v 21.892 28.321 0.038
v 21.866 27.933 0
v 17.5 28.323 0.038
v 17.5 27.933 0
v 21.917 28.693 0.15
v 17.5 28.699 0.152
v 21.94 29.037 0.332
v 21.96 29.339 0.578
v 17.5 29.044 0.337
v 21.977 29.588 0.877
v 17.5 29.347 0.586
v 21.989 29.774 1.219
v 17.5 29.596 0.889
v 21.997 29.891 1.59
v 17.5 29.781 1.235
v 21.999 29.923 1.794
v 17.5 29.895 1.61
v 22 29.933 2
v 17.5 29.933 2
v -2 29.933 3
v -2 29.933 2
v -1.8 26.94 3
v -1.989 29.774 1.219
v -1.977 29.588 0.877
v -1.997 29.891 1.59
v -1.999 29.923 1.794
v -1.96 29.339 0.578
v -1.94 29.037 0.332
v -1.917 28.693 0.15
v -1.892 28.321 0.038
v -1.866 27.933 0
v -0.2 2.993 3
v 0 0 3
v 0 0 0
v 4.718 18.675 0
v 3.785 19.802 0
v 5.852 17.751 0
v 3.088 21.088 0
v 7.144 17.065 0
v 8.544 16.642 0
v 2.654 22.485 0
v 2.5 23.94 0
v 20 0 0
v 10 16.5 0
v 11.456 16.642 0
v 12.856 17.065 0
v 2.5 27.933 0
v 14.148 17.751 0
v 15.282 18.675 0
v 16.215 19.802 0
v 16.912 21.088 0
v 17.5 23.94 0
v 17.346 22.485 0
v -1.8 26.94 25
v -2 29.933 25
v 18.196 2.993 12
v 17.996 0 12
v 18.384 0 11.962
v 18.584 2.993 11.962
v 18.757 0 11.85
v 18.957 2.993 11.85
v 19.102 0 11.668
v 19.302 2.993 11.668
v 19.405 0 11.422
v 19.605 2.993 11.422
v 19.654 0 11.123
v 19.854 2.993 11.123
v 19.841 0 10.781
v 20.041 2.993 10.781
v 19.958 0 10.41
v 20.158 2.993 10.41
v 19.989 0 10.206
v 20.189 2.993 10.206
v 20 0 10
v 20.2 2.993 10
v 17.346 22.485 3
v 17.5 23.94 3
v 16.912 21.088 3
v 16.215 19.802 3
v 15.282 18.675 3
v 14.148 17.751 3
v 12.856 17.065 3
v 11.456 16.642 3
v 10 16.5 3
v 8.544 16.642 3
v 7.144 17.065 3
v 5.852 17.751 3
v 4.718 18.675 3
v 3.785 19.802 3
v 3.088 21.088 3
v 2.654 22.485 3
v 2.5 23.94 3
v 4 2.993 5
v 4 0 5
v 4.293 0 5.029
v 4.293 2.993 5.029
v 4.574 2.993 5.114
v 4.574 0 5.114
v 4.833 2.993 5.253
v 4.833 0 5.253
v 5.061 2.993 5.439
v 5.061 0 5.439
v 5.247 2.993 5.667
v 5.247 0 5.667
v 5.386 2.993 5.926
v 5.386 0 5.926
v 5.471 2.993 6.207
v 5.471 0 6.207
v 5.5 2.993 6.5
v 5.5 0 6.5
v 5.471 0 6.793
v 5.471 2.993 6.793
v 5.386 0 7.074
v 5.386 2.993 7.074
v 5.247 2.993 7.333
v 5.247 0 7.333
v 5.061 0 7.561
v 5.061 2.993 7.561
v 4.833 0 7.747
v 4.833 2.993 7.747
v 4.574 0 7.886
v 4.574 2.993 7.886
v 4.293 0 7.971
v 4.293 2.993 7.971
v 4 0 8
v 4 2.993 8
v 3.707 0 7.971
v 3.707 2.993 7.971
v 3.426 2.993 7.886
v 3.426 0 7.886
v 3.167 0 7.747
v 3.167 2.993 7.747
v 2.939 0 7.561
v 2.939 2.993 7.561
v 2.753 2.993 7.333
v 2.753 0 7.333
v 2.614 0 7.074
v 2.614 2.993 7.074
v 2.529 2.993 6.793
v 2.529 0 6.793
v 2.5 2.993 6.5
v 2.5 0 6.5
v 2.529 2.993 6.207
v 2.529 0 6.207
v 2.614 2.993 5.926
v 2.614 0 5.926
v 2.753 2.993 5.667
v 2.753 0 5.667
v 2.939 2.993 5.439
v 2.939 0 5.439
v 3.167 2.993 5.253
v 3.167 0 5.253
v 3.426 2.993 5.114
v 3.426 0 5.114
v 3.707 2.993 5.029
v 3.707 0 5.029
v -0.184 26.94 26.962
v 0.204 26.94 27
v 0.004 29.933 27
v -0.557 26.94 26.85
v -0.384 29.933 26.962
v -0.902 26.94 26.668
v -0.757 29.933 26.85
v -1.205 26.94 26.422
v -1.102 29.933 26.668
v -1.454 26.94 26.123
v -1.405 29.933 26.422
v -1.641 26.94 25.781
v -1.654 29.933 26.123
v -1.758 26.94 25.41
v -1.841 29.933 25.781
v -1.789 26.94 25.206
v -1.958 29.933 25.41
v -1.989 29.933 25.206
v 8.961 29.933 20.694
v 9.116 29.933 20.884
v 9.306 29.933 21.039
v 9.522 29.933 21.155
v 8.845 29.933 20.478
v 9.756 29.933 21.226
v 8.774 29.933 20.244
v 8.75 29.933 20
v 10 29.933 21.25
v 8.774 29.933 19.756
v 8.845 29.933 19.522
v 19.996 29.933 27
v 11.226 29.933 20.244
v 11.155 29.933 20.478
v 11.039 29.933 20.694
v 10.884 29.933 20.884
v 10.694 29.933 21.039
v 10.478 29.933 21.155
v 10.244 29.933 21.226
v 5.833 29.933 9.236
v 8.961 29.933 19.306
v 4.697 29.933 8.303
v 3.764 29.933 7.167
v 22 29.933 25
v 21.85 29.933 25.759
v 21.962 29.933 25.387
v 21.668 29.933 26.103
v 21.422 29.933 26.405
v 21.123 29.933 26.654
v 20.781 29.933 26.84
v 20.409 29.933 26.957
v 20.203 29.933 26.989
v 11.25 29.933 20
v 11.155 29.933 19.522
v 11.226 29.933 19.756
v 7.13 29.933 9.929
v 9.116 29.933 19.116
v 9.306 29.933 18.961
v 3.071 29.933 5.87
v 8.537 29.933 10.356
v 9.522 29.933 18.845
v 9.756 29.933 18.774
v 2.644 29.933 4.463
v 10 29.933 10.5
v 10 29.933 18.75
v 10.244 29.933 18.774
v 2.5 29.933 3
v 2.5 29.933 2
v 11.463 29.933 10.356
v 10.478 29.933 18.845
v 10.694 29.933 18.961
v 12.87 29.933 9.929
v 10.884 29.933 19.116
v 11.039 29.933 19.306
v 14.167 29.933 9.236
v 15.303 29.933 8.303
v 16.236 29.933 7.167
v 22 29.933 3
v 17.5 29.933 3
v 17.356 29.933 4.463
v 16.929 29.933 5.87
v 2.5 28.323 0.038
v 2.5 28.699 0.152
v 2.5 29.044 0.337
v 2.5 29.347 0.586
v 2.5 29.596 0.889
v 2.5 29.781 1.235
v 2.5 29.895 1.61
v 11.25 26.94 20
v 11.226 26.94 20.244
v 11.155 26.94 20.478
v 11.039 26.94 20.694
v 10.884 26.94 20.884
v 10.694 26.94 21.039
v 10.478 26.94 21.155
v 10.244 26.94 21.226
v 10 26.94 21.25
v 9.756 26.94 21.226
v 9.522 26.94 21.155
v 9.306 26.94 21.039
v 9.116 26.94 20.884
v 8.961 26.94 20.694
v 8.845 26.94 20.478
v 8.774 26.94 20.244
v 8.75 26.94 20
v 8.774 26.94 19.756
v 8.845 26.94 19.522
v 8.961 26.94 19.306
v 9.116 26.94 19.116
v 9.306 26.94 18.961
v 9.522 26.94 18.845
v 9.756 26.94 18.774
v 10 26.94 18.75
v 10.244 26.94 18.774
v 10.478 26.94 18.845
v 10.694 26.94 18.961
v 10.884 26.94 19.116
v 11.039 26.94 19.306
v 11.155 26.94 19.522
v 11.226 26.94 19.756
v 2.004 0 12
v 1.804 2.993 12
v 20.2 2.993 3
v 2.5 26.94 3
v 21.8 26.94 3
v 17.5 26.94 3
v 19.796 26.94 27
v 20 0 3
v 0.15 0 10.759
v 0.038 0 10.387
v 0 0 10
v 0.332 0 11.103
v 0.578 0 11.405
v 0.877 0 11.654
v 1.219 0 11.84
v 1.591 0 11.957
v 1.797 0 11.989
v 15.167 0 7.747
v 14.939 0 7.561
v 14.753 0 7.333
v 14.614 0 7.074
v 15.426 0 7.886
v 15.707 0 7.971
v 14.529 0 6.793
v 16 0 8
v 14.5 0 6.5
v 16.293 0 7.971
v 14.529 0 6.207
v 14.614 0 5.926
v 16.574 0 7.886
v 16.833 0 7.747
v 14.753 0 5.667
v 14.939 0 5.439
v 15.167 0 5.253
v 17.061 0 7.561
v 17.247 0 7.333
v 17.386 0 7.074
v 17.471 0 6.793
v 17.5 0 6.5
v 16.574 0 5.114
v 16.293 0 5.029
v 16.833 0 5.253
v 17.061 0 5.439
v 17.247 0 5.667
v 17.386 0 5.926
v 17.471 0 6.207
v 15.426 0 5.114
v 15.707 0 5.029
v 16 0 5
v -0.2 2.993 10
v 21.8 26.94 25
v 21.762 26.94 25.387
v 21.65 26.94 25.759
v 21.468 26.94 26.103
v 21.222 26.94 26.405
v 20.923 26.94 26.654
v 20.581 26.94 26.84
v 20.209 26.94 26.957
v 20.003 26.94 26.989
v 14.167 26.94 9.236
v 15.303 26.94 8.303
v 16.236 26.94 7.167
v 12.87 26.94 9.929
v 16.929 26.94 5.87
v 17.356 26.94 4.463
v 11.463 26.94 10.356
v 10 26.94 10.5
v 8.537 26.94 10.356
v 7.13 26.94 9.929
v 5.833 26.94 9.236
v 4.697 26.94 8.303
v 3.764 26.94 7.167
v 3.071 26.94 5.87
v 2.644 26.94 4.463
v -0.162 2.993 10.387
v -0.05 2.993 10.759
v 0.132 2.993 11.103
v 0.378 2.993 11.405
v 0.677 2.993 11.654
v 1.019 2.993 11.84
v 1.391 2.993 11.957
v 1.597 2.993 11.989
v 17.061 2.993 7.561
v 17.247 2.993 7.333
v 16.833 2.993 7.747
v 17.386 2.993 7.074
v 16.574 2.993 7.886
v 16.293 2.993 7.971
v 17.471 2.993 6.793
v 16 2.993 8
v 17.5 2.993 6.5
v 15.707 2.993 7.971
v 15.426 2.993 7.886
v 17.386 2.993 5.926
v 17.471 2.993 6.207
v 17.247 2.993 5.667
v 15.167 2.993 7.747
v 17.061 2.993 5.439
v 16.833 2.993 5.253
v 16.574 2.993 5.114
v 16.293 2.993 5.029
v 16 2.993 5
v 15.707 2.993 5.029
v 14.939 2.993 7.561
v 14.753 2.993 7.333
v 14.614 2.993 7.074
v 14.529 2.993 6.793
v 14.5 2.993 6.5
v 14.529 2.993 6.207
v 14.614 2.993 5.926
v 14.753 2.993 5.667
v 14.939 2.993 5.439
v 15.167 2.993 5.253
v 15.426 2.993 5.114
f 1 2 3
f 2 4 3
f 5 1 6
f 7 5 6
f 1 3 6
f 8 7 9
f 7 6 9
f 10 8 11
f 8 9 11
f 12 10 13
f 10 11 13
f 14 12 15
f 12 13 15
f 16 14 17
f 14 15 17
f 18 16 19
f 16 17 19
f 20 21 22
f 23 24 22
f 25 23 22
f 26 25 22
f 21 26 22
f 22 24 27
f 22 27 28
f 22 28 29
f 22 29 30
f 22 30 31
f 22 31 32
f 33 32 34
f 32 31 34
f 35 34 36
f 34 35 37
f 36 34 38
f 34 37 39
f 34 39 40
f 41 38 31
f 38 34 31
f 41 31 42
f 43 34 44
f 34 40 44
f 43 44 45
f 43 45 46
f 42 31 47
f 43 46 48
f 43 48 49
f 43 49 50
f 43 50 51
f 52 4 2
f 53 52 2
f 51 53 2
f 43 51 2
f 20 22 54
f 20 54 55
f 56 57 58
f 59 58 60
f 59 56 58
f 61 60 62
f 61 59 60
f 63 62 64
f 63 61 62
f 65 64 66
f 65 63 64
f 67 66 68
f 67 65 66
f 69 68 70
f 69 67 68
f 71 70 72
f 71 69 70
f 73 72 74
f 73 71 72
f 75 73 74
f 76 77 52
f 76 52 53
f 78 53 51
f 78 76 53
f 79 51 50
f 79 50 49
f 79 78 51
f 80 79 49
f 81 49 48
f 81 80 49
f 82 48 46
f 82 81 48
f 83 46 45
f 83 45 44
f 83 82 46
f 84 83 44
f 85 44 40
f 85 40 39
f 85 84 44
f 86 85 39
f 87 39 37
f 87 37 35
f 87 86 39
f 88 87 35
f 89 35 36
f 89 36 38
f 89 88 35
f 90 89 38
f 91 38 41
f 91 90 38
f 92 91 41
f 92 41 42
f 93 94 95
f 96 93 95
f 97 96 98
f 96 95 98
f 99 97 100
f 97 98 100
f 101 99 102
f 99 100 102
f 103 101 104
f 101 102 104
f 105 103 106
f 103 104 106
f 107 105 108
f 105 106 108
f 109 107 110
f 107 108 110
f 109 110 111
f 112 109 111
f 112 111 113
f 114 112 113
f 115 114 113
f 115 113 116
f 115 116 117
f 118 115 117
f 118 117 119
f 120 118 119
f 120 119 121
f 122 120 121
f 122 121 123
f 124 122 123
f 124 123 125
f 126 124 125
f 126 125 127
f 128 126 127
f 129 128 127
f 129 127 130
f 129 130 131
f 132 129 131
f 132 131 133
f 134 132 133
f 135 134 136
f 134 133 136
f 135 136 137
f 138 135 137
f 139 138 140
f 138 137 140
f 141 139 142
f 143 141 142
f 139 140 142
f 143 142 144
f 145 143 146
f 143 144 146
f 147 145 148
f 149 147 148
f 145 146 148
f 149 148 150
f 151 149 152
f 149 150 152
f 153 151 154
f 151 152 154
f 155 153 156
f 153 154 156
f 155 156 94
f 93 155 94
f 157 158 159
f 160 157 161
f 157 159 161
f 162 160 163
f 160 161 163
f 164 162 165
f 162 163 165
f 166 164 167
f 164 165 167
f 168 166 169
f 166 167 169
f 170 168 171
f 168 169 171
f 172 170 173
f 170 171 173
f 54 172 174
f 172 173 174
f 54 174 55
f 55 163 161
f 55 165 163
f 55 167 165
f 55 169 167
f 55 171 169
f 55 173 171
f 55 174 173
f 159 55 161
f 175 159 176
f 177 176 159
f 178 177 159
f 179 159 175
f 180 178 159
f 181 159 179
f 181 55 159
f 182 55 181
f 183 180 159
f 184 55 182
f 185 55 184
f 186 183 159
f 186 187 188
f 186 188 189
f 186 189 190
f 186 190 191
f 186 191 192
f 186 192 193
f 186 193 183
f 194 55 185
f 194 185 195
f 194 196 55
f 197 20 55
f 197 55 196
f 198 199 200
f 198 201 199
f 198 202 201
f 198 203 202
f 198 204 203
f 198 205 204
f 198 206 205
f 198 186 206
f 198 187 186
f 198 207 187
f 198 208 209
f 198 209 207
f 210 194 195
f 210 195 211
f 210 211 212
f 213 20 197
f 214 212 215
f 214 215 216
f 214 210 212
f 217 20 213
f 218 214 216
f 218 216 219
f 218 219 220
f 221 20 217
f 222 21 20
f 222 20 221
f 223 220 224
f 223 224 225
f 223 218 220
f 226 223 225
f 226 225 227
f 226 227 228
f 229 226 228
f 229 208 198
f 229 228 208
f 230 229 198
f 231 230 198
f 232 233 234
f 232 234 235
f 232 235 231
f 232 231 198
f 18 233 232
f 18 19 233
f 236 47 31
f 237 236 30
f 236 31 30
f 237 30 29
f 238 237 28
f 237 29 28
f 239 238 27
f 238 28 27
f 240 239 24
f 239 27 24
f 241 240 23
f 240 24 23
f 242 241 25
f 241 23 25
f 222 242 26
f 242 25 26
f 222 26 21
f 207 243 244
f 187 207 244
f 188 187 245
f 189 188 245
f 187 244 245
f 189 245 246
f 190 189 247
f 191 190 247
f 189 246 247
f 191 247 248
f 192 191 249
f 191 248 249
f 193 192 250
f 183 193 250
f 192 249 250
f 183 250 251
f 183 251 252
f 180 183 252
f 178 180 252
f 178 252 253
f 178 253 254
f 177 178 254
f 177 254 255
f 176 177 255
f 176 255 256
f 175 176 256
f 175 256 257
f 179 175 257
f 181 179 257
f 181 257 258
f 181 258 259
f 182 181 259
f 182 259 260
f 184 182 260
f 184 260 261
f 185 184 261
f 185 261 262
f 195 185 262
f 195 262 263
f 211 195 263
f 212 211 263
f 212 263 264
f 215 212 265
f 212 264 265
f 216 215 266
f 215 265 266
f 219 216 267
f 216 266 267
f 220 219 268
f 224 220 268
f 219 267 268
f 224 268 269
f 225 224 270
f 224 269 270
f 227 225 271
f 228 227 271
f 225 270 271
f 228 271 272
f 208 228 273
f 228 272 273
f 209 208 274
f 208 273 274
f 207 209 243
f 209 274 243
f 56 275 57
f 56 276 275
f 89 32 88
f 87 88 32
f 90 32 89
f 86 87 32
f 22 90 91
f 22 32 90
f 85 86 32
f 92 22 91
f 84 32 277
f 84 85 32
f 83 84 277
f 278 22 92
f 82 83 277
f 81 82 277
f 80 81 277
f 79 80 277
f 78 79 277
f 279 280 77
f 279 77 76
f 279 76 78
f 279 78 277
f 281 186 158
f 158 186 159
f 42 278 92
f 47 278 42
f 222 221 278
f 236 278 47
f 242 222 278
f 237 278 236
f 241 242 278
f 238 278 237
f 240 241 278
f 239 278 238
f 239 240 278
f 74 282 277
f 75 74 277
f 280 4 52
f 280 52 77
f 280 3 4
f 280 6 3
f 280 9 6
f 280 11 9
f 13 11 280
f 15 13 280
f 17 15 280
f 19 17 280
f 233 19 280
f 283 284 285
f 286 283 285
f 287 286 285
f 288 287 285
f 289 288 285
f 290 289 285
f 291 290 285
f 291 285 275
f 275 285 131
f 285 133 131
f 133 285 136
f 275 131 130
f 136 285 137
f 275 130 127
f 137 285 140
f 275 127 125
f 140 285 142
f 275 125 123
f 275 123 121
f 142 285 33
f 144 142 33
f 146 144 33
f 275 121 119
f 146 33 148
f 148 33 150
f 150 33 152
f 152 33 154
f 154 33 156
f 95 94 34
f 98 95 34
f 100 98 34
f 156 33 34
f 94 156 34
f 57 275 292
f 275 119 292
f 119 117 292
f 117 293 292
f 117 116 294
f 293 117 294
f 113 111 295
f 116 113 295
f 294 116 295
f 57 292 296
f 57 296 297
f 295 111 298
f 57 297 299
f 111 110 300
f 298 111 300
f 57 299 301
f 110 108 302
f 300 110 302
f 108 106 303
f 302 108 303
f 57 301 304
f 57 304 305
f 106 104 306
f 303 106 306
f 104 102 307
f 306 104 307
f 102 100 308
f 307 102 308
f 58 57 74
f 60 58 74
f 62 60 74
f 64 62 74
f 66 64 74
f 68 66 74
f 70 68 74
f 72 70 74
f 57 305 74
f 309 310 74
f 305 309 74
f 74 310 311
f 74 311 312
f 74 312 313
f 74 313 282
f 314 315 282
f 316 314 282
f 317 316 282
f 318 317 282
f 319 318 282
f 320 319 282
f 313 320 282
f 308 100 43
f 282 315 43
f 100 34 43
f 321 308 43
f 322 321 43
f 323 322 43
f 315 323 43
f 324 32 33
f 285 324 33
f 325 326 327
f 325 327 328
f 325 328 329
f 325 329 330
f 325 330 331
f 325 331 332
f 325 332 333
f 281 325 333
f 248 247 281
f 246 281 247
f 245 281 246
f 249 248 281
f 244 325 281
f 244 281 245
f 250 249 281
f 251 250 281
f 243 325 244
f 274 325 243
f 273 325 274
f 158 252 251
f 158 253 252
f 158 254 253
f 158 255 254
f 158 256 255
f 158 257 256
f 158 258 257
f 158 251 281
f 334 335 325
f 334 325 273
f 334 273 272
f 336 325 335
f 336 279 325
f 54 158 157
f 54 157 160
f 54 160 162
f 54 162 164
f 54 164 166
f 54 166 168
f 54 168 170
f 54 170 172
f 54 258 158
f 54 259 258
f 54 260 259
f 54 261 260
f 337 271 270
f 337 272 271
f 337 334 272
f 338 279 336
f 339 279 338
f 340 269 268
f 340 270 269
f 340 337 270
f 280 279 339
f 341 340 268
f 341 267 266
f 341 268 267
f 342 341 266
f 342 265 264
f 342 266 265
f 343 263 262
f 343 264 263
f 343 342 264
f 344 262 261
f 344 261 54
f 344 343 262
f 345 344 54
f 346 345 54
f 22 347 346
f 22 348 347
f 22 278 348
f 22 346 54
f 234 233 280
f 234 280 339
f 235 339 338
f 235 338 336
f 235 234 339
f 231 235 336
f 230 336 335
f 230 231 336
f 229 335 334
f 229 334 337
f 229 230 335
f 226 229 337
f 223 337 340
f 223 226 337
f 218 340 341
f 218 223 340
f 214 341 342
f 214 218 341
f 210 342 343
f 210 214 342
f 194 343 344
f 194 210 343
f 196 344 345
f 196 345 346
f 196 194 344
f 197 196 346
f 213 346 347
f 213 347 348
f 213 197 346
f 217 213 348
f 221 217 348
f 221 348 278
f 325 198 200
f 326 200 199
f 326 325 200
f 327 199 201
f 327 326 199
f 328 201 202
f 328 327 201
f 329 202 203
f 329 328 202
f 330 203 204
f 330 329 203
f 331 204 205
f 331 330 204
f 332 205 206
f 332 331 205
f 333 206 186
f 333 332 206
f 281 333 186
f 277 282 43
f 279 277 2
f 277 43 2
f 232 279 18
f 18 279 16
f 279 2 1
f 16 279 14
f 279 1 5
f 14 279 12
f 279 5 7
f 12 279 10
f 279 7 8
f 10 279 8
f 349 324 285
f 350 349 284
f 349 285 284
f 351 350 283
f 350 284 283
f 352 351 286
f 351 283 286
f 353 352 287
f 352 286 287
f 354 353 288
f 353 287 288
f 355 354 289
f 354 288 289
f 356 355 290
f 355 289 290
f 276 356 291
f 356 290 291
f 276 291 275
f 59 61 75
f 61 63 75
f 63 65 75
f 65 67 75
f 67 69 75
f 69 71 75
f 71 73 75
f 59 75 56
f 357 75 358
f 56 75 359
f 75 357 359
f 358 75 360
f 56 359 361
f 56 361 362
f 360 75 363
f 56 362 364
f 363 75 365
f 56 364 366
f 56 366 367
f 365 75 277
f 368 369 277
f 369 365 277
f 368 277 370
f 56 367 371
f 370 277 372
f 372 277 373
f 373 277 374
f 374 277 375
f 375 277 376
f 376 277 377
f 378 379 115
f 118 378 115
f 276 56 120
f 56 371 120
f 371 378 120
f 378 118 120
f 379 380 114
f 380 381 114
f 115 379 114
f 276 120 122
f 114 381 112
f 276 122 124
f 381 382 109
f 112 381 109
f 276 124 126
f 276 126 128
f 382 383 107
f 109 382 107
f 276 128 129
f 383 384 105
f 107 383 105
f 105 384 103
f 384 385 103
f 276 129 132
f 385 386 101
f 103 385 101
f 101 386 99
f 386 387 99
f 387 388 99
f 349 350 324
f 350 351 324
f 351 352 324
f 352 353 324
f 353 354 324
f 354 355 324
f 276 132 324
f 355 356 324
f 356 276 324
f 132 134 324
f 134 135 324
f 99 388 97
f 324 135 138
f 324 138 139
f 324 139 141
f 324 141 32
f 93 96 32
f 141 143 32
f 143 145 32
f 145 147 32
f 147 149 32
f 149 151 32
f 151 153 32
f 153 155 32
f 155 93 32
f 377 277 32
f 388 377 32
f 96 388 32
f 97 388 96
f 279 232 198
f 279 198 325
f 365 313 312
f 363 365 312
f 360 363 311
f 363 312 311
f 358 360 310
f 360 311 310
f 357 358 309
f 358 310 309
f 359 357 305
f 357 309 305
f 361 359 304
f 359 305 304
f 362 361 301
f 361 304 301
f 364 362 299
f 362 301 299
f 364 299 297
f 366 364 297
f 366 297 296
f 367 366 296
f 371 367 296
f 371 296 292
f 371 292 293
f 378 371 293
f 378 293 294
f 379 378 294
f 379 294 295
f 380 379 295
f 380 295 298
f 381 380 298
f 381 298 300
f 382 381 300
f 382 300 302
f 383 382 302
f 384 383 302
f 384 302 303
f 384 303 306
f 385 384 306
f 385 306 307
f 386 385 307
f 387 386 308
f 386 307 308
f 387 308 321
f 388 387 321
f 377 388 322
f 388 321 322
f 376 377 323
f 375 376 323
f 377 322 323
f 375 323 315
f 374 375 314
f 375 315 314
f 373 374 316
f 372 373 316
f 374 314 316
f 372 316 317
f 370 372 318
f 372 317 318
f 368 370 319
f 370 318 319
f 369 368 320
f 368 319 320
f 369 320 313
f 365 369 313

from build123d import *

# Parameters (mm, degrees)
SALIENTE_EXTRUIR1_DEPTH      = 3
SALIENTE_EXTRUIR2_DEPTH      = 9
SALIENTE_EXTRUIR3_DEPTH      = 24
CORTAR_EXTRUIR1_DEPTH        = 3
CORTAR_EXTRUIR_L_MINA1_START = -2.993325909
CORTAR_EXTRUIR_L_MINA1_DEPTH = 2.993325909
REDONDEO1_R                  = 2
CROQUIS6_R                   = 1.25
CORTAR_EXTRUIR2_DEPTH        = 3
CROQUIS7_R                   = 1.5
CORTAR_EXTRUIR3_DEPTH        = 3


# Read off the part's stored shape, not the designer's step: Cortar-Extruir-Lámina1
with BuildPart() as part:
    # Croquis1 → Saliente-Extruir1 (new body)
    with BuildSketch(Plane.XY):
        Polygon((0, 0), (20, 0), (22, 29.933259094), (-2, 29.933259094), align=None)
    extrude(amount=SALIENTE_EXTRUIR1_DEPTH)

    # Croquis2 → Saliente-Extruir2 (add)
    with BuildSketch(Plane.XY.offset(3)):
        Polygon((0, 0), (20, 0), (20.2, 2.993325909), (-0.2, 2.993325909), align=None)
    extrude(amount=SALIENTE_EXTRUIR2_DEPTH)

    # Croquis3 → Saliente-Extruir3 (add)
    with BuildSketch(Plane.XY.offset(3)):
        Polygon((22, 29.933259094), (21.8, 26.939933185), (-1.8, 26.939933185), (-2, 29.933259094), align=None)
    extrude(amount=SALIENTE_EXTRUIR3_DEPTH)

    # Croquis4 → Cortar-Extruir1 (cut)
    with BuildSketch(Plane.XY.offset(3)):
        with BuildLine():
            Line((17.5, 26.939933185), (17.5, 23.939933185))
            ThreePointArc((17.5, 23.939933185), (10, 16.499759469), (2.5, 23.939933185))
            Line((2.5, 23.939933185), (2.5, 26.939933185))
            Line((2.5, 26.939933185), (17.5, 26.939933185))
        make_face()
    extrude(amount=-CORTAR_EXTRUIR1_DEPTH, mode=Mode.SUBTRACT)

    # Cortar-Extruir-Lámina1 outline → Cortar-Extruir-Lámina1 (cut)
    with BuildSketch(Plane.XZ.offset(-26.939933185).offset(CORTAR_EXTRUIR_L_MINA1_START)):
        with BuildLine():
            Line((2.5, 0), (17.5, 0))
            Line((17.5, 0), (17.5, 3))
            ThreePointArc((17.5, 3), (10, 10.5), (2.5, 3))
            Line((2.5, 3), (2.5, 0))
        make_face()
    extrude(amount=CORTAR_EXTRUIR_L_MINA1_DEPTH, mode=Mode.SUBTRACT)

    # Redondeo1
    redondeo1_edges = [part.edges().sort_by_distance(p)[0] for p in [
        (-0.1, 1.496662955, 12),
        (20.1, 1.496662955, 12),
        (-1.9, 28.436596139, 27),
        (21.9, 28.436596139, 27),
        (19.75, 29.933259094, 0),
        (0.25, 29.933259094, 0),
    ]]
    fillet(redondeo1_edges, radius=REDONDEO1_R)

    # Croquis6 → Cortar-Extruir2 (cut)
    with BuildSketch(Plane.XZ.offset(-26.939933185)):
        with Locations((10, 20)):
            Circle(CROQUIS6_R)
    extrude(amount=-CORTAR_EXTRUIR2_DEPTH, mode=Mode.SUBTRACT)

    # Croquis7 → Cortar-Extruir3 (cut)
    with BuildSketch(Plane.XZ):
        with Locations(Location((4, 6.5, 0), (0, 0, 270))):
            Circle(CROQUIS7_R)
        with Locations((16, 6.5)):
            Circle(CROQUIS7_R)
    extrude(amount=-CORTAR_EXTRUIR3_DEPTH, mode=Mode.SUBTRACT)


solid = part.part
